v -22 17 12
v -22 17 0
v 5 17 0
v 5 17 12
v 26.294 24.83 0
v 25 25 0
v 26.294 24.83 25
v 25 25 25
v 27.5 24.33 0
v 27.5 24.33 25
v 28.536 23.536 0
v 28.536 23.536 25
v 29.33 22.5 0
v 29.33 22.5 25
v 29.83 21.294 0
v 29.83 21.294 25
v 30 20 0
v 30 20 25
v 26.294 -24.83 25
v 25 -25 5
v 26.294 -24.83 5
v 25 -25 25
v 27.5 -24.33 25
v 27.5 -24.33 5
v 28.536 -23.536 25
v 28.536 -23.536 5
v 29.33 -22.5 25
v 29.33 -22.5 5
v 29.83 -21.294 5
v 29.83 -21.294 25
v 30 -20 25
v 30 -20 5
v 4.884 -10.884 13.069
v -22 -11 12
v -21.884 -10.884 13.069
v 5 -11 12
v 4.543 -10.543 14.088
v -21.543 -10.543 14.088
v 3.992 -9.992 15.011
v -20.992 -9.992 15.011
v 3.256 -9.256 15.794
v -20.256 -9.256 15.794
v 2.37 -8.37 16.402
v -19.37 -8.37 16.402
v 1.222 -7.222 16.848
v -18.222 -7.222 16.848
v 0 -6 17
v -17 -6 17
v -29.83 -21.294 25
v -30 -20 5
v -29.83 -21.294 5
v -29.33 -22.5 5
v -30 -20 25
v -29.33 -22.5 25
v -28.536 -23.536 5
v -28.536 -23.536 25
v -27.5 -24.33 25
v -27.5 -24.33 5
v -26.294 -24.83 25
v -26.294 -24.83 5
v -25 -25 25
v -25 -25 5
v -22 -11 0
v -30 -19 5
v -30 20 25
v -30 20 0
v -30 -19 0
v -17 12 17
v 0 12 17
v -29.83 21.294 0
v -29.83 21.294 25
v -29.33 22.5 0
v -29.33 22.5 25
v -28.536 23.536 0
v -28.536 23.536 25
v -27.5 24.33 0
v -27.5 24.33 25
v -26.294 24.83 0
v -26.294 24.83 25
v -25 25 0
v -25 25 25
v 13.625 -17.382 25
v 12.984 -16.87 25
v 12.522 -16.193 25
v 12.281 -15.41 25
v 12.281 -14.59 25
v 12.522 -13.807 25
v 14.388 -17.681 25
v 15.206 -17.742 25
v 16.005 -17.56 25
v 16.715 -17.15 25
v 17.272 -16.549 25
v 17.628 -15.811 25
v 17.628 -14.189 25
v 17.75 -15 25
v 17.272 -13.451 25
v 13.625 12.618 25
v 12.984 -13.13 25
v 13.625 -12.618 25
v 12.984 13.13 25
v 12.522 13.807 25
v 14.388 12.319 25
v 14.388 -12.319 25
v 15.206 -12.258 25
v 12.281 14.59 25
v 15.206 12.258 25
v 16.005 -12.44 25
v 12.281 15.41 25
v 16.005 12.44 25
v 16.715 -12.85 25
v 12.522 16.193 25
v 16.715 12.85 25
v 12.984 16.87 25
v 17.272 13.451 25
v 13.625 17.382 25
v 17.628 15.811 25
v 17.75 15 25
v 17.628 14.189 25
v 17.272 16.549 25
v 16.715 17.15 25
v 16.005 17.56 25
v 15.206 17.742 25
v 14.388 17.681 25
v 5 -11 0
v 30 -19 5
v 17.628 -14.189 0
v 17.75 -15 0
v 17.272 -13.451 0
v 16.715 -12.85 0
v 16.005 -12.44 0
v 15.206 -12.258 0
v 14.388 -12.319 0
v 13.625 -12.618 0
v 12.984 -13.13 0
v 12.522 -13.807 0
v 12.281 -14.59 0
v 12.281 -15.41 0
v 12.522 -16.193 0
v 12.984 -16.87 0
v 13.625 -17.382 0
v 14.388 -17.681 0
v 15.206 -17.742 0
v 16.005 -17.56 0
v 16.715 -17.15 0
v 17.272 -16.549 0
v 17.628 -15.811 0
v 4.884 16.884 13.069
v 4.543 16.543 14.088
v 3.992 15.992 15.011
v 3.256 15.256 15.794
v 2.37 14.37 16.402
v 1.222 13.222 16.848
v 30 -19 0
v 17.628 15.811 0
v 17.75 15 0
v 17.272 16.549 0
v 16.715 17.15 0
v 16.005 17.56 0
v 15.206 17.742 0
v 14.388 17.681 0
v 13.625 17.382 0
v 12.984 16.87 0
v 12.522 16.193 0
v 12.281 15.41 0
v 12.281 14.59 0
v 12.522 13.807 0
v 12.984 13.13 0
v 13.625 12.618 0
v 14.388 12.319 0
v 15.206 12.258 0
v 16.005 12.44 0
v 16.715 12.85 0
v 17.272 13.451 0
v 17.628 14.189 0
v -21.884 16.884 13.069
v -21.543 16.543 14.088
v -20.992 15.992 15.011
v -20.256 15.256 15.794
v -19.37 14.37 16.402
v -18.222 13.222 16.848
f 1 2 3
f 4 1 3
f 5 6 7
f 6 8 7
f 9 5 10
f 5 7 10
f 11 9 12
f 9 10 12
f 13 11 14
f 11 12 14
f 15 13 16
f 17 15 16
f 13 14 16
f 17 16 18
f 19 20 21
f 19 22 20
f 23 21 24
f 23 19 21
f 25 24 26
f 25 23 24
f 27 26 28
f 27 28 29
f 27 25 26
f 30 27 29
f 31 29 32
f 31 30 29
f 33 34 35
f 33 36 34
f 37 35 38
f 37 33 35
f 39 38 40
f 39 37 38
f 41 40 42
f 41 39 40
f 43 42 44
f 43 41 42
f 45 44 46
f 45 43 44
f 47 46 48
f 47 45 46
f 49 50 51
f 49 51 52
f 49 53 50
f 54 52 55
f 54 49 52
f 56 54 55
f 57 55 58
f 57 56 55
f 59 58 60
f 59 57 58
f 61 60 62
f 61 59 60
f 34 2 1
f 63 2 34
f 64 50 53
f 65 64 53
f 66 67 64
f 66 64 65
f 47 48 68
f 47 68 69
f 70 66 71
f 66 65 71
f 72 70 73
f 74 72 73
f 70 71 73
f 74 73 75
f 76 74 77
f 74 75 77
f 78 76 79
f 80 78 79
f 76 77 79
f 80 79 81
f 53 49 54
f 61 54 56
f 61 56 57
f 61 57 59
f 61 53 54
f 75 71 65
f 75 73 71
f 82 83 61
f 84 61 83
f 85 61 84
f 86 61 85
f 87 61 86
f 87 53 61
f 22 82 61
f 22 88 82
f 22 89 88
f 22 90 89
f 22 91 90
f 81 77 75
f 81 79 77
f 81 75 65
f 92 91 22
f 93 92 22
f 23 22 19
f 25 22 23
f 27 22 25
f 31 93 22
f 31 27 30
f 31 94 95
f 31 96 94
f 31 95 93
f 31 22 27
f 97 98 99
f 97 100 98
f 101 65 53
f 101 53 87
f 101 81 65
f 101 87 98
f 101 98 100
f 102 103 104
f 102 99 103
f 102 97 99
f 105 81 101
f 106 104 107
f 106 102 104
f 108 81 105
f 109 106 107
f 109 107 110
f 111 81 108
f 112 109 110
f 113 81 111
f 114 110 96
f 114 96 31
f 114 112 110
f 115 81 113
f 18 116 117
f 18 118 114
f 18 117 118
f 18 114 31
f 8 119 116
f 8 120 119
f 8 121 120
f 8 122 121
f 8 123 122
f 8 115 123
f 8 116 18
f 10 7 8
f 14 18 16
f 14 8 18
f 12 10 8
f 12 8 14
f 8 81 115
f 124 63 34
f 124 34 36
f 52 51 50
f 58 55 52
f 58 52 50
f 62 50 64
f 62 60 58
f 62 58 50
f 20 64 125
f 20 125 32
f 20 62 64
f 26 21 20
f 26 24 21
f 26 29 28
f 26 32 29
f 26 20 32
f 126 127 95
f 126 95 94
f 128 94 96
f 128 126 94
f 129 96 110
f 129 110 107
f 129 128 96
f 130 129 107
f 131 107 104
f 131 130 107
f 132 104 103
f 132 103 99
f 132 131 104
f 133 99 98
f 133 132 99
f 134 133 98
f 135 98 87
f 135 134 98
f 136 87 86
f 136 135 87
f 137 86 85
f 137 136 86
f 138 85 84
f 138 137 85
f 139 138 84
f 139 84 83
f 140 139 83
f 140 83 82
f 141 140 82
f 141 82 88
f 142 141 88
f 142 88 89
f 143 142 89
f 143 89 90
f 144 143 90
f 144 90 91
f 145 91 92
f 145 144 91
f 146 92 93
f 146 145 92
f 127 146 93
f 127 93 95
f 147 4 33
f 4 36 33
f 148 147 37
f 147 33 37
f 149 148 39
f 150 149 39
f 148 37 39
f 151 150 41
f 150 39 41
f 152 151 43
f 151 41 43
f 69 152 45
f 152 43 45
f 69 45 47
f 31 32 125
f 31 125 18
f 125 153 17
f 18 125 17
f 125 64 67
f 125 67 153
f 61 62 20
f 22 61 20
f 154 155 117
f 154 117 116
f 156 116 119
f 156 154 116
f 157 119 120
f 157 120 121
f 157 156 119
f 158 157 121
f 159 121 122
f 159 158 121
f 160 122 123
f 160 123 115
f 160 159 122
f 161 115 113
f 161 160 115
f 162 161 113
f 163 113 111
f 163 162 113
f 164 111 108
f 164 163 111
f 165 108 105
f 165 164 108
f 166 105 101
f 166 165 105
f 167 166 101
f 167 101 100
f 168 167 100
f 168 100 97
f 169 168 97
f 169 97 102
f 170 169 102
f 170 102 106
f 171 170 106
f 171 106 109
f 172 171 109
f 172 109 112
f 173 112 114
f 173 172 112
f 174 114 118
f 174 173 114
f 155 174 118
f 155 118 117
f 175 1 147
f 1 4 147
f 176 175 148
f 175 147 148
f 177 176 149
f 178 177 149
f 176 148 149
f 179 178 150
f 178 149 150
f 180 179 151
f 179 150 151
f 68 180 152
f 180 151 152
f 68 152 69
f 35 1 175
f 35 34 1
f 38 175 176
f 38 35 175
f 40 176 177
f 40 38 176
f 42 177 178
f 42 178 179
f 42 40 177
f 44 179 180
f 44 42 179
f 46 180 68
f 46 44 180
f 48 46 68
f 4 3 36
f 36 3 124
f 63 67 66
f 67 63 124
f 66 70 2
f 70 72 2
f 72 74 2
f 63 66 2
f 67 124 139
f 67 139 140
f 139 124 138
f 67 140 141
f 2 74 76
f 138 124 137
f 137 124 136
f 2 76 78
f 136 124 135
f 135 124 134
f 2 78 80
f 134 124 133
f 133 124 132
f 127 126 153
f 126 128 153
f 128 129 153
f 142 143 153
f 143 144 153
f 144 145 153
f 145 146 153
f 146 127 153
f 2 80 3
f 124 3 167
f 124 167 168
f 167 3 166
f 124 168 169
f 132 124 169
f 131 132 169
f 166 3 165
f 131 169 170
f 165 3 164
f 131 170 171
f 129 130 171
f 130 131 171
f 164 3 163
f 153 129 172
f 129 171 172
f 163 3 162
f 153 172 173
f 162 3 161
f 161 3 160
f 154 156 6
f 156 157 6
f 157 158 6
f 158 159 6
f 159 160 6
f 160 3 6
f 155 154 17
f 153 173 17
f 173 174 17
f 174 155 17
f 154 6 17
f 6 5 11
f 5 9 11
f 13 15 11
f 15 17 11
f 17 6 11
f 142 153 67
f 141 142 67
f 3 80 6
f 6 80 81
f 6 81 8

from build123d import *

# Parameters (mm, degrees)
F0_W     = 60
F0_H     = 50
F0_R     = 2.75
F1_DEPTH = 25
F2_W     = 60
F2_H     = 5
F3_DEPTH = 6
F4_R     = 5
F5_W     = 27
F5_H     = 28
F6_DEPTH = 17
F7_R     = 5


with BuildPart() as f1:
    # F0 (on Top) → F1 (new body)
    with BuildSketch(Plane.XY):
        Rectangle(F0_W, F0_H)
        with Locations((15, -15)):
            Circle(F0_R, mode=Mode.SUBTRACT)
        with Locations((15, 15)):
            Circle(F0_R, mode=Mode.SUBTRACT)
    extrude(amount=F1_DEPTH)

    # F2 (on face) → F3 (cut)
    with BuildSketch(Plane.XZ.offset(25)):
        with Locations((0, 2.5)):
            Rectangle(F2_W, F2_H)
    extrude(amount=-F3_DEPTH, mode=Mode.SUBTRACT)

    # F4
    f4_edges = [f1.edges().sort_by_distance(p)[0] for p in [
        (30, -25, 15),
        (-30, -25, 15),
        (-30, 25, 12.5),
        (30, 25, 12.5),
    ]]
    fillet(f4_edges, radius=F4_R)

    # F5 (on face) → F6 (cut)
    with BuildSketch(Plane(origin=(0, 0, 0), x_dir=(1, 0, 0), z_dir=(0, 0, -1))):
        with Locations((-8.5, -3)):
            Rectangle(F5_W, F5_H)
    extrude(amount=-F6_DEPTH, mode=Mode.SUBTRACT)

    # F7
    f7_edges = [f1.edges().sort_by_distance(p)[0] for p in [
        (-8.5, -11, 17),
        (5, 3, 17),
        (-8.5, 17, 17),
        (-22, 3, 17),
    ]]
    fillet(f7_edges, radius=F7_R)


solid = f1.part
